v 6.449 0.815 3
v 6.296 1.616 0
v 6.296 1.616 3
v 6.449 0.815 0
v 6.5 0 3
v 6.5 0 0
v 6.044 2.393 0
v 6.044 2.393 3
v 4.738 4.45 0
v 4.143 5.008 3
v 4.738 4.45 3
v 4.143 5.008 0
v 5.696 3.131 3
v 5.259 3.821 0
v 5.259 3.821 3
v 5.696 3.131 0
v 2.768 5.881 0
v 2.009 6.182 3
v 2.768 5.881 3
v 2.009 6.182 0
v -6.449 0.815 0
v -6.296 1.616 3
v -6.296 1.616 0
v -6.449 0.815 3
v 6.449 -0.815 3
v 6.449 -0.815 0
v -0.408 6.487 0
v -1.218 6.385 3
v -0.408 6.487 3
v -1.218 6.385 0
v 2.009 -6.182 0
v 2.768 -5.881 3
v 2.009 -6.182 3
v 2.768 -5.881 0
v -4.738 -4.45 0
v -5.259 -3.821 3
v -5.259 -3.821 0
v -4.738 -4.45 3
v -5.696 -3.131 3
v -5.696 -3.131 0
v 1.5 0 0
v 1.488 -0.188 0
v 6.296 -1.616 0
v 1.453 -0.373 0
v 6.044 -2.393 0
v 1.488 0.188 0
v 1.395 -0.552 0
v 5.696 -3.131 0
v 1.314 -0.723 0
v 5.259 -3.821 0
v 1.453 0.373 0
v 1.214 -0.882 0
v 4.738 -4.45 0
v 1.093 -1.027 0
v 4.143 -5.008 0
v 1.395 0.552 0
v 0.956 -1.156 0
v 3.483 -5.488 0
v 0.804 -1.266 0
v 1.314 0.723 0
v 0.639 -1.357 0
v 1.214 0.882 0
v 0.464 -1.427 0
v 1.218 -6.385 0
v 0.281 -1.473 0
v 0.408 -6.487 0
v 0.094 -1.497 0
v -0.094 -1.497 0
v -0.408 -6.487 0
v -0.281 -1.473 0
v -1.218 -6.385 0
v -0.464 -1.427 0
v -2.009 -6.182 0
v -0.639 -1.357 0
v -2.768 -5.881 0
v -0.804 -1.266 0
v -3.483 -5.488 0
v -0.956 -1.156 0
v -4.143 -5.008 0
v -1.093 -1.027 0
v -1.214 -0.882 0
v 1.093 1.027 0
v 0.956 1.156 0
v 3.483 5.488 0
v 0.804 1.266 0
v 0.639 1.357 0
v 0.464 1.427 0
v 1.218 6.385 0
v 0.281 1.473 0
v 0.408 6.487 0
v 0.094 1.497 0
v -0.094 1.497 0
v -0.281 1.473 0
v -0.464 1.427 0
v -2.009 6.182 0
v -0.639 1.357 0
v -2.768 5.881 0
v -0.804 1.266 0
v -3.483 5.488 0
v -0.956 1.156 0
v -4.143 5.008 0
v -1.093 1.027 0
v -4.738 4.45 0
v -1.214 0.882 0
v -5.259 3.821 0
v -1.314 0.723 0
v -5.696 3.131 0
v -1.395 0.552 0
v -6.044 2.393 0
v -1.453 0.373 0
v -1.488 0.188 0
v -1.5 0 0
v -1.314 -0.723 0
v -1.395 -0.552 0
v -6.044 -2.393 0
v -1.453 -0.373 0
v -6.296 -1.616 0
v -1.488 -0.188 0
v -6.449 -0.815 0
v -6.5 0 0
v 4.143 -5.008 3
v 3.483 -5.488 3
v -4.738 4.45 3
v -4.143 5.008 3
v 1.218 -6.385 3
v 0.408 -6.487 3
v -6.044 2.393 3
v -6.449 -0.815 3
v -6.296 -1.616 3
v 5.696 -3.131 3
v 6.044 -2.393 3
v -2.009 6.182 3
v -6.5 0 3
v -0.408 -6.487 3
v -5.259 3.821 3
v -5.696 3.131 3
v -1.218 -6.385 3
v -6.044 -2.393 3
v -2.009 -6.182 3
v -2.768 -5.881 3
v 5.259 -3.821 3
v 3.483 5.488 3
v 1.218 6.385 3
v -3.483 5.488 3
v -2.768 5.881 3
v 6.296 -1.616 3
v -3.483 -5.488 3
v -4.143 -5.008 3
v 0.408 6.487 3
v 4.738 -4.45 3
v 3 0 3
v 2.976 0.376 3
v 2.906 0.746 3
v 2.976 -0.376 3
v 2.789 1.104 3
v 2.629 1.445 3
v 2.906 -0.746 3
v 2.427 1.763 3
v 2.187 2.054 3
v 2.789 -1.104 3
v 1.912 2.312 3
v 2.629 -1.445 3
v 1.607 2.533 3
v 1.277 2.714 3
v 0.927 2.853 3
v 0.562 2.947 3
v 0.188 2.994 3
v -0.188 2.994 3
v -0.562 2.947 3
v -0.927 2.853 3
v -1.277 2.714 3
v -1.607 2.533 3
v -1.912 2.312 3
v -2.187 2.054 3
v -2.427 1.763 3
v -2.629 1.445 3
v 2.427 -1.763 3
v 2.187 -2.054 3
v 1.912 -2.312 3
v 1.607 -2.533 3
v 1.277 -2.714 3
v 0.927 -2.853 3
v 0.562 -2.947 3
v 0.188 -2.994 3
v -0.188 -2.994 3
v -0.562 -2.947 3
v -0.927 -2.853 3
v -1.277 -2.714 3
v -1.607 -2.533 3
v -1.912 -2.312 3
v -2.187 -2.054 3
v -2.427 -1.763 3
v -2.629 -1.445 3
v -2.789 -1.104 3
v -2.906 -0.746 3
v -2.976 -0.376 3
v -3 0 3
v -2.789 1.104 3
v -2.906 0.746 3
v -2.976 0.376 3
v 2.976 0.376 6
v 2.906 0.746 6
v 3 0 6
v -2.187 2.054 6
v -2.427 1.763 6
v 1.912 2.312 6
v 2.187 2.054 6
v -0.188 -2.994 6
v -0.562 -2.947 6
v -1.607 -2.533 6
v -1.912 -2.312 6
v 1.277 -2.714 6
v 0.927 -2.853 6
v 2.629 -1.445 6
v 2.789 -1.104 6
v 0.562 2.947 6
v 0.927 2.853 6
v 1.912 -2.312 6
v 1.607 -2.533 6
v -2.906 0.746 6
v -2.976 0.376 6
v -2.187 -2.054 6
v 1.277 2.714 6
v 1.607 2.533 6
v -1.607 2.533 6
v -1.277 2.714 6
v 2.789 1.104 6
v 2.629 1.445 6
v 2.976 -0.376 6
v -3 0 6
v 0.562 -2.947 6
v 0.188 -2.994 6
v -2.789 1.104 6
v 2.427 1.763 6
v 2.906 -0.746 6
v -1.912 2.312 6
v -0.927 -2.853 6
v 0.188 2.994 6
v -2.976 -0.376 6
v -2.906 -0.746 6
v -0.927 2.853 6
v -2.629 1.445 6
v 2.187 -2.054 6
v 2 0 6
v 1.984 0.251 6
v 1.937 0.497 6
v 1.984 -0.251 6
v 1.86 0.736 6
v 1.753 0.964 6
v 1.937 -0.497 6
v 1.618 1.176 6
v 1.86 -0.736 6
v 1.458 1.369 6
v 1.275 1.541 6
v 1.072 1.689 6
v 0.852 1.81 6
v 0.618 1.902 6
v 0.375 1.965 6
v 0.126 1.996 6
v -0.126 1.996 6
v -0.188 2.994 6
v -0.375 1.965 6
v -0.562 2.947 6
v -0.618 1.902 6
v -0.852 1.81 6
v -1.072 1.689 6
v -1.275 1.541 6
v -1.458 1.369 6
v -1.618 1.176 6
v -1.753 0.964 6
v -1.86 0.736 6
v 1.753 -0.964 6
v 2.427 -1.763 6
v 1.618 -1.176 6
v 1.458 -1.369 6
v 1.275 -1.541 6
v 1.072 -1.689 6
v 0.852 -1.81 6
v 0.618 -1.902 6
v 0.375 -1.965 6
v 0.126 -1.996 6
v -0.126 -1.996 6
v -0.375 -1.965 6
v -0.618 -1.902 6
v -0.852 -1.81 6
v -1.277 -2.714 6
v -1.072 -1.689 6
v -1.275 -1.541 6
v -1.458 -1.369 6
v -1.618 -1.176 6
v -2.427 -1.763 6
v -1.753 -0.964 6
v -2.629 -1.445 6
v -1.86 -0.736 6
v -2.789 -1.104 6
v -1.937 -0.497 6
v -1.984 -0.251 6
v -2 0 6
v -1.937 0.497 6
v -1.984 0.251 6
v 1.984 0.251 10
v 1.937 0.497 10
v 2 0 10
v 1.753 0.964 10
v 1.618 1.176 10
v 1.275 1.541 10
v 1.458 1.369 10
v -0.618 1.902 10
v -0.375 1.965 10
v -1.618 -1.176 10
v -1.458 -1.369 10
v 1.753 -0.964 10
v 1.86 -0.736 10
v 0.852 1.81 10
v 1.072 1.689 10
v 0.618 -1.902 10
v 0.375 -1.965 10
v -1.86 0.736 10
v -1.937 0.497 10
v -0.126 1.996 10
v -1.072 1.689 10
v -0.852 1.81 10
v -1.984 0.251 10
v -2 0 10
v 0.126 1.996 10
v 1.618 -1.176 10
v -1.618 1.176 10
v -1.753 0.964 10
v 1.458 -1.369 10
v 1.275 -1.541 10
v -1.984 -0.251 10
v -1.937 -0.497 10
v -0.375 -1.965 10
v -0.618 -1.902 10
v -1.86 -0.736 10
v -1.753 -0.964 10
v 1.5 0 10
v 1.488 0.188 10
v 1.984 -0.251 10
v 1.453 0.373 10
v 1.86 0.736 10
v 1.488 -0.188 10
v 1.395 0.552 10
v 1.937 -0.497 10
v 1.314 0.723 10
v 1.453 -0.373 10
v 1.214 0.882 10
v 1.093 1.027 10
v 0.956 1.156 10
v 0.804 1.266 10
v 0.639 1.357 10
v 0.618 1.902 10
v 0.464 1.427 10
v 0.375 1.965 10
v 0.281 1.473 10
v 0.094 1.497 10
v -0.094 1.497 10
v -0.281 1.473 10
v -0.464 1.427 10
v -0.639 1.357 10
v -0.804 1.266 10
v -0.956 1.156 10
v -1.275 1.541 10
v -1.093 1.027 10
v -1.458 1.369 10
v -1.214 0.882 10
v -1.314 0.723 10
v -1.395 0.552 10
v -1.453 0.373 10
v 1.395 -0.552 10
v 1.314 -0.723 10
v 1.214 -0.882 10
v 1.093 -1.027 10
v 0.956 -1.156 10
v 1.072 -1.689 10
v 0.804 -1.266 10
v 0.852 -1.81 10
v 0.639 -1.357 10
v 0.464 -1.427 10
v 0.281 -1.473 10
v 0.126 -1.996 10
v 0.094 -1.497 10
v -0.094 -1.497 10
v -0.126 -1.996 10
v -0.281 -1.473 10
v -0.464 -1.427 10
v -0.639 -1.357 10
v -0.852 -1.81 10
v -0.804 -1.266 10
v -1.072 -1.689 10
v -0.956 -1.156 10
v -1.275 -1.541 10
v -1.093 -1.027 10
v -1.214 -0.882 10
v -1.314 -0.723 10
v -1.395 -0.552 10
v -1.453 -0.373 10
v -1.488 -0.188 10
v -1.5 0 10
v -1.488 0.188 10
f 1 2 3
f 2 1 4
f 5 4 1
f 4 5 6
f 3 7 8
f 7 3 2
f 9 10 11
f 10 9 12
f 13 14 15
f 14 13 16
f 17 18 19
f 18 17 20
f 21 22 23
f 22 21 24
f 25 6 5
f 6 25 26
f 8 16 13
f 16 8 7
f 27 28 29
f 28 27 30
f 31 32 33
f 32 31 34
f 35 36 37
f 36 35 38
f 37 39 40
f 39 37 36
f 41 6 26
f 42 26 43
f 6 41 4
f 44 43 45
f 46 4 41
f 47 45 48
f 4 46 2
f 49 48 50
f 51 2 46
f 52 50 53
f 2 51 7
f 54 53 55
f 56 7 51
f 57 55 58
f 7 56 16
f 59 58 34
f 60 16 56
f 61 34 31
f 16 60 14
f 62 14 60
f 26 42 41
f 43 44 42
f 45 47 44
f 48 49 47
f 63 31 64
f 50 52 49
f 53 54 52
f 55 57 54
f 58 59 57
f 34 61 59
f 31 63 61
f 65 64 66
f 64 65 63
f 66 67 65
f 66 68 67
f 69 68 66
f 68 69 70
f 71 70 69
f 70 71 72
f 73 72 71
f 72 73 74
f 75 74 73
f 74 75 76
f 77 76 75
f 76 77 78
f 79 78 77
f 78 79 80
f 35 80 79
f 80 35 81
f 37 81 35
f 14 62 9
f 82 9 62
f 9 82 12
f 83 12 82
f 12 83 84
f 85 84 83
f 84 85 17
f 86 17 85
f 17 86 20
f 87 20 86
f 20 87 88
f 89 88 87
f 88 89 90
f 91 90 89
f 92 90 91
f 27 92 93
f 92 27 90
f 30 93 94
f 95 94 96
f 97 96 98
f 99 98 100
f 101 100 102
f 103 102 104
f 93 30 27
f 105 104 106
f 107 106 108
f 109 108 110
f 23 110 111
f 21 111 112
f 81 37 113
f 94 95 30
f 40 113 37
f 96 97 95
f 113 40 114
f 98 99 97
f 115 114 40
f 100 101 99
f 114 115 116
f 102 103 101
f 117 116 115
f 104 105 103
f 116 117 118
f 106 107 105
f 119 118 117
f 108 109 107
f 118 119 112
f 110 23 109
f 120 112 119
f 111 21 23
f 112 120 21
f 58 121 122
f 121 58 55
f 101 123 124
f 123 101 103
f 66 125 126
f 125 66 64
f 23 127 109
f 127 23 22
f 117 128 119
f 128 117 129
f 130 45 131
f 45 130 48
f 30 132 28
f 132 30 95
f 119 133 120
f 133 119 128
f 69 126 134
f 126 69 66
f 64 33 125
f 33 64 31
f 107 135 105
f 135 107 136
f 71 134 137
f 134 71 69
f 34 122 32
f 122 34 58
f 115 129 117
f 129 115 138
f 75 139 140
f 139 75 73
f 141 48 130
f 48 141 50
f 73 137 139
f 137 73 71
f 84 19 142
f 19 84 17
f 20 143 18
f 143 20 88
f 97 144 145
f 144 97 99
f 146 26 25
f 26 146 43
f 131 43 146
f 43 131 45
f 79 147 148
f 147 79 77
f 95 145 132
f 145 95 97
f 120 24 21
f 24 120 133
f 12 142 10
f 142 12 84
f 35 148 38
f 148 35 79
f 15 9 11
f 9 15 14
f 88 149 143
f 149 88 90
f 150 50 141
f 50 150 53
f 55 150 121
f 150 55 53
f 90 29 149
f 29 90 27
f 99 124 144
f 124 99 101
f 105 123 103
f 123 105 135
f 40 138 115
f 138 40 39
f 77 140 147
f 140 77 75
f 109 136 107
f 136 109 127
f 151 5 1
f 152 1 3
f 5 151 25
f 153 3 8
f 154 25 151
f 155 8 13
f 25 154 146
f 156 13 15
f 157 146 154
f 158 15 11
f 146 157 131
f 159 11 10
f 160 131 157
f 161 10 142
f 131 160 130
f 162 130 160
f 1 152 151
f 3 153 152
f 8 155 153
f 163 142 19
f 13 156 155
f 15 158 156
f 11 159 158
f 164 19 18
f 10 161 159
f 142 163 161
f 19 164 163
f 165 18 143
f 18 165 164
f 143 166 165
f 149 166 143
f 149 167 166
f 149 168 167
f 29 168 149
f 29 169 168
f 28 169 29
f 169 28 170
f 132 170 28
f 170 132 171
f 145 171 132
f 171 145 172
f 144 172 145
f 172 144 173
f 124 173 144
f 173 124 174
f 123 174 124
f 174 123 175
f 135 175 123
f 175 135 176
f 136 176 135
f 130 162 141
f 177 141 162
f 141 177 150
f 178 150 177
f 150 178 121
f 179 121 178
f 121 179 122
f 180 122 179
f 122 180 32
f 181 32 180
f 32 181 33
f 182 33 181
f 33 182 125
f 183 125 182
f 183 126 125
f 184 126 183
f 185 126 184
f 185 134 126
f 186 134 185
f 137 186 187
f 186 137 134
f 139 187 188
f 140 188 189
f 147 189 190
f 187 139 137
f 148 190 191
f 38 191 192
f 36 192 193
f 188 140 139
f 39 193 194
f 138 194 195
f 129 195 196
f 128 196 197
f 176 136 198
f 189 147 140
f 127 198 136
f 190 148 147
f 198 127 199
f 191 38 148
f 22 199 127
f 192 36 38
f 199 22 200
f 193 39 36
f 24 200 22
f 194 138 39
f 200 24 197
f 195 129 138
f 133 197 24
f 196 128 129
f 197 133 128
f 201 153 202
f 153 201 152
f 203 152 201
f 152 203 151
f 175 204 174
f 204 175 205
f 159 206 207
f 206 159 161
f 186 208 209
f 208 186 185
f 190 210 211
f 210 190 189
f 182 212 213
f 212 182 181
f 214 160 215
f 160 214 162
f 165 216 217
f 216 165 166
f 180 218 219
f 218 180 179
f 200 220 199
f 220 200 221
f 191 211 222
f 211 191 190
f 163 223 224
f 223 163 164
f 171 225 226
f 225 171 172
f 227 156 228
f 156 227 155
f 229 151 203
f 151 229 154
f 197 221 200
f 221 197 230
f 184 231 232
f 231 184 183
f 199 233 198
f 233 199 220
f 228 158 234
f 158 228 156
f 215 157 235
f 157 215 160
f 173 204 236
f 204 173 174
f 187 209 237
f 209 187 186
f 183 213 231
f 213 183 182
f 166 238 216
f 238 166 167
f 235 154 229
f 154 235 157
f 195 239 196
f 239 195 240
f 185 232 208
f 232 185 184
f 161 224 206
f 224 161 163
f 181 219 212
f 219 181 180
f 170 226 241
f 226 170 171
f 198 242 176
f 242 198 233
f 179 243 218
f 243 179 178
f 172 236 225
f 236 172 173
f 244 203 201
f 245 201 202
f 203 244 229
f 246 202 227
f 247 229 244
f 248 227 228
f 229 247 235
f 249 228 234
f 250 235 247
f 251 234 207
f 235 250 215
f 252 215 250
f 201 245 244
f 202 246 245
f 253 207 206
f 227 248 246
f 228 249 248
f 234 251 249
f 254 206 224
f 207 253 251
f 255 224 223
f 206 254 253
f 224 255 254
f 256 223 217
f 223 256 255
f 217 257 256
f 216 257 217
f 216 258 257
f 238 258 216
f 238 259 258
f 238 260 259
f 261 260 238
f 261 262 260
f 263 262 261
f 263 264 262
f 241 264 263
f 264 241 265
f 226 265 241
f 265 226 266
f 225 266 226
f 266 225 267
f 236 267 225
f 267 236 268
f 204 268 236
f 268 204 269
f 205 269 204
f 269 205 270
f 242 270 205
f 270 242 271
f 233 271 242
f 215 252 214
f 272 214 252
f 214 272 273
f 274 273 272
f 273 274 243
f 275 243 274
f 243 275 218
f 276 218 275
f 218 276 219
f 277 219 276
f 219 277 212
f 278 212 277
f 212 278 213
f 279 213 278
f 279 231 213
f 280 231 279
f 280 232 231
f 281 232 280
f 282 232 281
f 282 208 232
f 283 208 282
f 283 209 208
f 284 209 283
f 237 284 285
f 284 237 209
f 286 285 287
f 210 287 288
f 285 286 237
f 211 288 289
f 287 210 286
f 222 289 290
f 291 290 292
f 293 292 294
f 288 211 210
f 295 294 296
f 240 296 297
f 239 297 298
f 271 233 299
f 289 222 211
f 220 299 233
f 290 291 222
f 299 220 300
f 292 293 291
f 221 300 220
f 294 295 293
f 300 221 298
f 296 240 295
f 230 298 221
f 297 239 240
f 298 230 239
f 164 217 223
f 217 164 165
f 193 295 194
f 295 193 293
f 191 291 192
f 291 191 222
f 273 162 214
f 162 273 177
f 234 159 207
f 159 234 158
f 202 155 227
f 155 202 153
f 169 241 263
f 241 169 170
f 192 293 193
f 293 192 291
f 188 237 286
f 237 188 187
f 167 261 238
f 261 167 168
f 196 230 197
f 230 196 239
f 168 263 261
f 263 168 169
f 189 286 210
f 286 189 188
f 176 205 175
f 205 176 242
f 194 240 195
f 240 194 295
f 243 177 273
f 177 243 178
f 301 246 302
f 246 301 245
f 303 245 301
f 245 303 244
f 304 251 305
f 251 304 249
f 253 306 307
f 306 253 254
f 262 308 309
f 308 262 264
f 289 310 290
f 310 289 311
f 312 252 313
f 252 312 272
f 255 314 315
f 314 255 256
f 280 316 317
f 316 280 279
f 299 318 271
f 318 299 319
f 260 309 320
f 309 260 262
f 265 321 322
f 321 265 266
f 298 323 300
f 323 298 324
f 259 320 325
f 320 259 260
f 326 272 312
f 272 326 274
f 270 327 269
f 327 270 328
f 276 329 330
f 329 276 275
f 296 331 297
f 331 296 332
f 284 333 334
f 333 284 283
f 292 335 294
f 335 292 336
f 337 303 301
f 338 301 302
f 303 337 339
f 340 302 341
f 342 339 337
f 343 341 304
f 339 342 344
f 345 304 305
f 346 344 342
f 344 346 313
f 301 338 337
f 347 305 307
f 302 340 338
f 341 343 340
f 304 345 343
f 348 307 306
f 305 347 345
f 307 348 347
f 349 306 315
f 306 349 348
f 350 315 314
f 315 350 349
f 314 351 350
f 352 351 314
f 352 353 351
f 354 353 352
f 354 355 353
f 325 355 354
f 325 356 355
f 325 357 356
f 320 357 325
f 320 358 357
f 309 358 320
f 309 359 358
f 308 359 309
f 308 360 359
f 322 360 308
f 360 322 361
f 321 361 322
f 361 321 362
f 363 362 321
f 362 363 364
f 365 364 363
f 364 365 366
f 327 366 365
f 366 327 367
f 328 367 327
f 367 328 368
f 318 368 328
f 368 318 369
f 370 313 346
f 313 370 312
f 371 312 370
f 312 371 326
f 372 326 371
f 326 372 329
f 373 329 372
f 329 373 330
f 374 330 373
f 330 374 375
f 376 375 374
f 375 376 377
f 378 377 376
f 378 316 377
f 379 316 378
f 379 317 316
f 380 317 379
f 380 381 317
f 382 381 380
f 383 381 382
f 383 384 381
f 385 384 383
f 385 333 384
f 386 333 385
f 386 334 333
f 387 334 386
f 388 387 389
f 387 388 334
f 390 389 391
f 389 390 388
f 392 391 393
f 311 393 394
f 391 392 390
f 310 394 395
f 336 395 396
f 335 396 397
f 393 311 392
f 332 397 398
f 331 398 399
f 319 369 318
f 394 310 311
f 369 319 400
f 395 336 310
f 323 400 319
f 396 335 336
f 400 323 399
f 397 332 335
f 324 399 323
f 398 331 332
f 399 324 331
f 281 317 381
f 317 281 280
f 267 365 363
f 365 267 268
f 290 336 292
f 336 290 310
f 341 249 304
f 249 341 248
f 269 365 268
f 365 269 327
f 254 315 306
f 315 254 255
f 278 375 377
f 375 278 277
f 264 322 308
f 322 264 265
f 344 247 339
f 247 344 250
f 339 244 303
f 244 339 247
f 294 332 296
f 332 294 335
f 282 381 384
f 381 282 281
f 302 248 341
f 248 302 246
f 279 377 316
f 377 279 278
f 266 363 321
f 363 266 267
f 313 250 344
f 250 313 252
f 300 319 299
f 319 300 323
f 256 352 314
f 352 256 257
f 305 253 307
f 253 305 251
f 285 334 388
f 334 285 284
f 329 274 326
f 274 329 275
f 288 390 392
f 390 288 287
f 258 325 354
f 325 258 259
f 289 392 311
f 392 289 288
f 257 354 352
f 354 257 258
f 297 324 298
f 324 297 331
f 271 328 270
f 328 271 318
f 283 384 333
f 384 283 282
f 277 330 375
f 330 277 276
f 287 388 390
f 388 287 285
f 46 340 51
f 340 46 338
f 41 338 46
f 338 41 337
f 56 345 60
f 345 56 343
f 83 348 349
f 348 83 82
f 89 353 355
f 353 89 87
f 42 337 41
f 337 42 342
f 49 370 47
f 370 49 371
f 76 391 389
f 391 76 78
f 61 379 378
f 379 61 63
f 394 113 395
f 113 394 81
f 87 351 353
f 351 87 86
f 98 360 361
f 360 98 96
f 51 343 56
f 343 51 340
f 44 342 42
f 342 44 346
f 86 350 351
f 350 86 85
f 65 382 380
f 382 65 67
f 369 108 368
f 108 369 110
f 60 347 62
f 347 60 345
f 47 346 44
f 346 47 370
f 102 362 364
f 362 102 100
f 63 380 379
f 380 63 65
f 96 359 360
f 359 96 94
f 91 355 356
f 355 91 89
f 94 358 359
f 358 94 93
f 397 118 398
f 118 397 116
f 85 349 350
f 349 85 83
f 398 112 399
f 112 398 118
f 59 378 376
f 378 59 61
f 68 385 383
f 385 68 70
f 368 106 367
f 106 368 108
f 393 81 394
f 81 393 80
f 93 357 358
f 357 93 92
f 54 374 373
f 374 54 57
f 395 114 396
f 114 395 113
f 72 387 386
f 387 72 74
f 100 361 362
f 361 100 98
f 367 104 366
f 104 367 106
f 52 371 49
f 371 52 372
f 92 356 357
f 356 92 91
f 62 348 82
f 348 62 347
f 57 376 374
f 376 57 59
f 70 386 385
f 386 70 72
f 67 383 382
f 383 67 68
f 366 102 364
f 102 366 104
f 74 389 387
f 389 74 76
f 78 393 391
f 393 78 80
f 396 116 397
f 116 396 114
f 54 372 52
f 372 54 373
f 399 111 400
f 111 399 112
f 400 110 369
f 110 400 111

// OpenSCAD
BASE_DIAMETER = 13;
BASE_HEIGHT = 3;
MIDDLE_DIAMETER = 6;
MIDDLE_HEIGHT = 3;
TOP_DIAMETER = 4;
TOP_HEIGHT = 4;
SCREW_DIAMETER = 3;

$fn = 50;
difference()
{
    union ()
    {
        cylinder(d = BASE_DIAMETER, h = BASE_HEIGHT);
        translate([0, 0, BASE_HEIGHT]) cylinder(d = MIDDLE_DIAMETER, h = MIDDLE_HEIGHT);
        translate([0, 0, BASE_HEIGHT + MIDDLE_HEIGHT]) cylinder(d = TOP_DIAMETER, h = TOP_HEIGHT);
    }
    cylinder(d = SCREW_DIAMETER, h = BASE_HEIGHT + MIDDLE_HEIGHT + TOP_HEIGHT);
}
